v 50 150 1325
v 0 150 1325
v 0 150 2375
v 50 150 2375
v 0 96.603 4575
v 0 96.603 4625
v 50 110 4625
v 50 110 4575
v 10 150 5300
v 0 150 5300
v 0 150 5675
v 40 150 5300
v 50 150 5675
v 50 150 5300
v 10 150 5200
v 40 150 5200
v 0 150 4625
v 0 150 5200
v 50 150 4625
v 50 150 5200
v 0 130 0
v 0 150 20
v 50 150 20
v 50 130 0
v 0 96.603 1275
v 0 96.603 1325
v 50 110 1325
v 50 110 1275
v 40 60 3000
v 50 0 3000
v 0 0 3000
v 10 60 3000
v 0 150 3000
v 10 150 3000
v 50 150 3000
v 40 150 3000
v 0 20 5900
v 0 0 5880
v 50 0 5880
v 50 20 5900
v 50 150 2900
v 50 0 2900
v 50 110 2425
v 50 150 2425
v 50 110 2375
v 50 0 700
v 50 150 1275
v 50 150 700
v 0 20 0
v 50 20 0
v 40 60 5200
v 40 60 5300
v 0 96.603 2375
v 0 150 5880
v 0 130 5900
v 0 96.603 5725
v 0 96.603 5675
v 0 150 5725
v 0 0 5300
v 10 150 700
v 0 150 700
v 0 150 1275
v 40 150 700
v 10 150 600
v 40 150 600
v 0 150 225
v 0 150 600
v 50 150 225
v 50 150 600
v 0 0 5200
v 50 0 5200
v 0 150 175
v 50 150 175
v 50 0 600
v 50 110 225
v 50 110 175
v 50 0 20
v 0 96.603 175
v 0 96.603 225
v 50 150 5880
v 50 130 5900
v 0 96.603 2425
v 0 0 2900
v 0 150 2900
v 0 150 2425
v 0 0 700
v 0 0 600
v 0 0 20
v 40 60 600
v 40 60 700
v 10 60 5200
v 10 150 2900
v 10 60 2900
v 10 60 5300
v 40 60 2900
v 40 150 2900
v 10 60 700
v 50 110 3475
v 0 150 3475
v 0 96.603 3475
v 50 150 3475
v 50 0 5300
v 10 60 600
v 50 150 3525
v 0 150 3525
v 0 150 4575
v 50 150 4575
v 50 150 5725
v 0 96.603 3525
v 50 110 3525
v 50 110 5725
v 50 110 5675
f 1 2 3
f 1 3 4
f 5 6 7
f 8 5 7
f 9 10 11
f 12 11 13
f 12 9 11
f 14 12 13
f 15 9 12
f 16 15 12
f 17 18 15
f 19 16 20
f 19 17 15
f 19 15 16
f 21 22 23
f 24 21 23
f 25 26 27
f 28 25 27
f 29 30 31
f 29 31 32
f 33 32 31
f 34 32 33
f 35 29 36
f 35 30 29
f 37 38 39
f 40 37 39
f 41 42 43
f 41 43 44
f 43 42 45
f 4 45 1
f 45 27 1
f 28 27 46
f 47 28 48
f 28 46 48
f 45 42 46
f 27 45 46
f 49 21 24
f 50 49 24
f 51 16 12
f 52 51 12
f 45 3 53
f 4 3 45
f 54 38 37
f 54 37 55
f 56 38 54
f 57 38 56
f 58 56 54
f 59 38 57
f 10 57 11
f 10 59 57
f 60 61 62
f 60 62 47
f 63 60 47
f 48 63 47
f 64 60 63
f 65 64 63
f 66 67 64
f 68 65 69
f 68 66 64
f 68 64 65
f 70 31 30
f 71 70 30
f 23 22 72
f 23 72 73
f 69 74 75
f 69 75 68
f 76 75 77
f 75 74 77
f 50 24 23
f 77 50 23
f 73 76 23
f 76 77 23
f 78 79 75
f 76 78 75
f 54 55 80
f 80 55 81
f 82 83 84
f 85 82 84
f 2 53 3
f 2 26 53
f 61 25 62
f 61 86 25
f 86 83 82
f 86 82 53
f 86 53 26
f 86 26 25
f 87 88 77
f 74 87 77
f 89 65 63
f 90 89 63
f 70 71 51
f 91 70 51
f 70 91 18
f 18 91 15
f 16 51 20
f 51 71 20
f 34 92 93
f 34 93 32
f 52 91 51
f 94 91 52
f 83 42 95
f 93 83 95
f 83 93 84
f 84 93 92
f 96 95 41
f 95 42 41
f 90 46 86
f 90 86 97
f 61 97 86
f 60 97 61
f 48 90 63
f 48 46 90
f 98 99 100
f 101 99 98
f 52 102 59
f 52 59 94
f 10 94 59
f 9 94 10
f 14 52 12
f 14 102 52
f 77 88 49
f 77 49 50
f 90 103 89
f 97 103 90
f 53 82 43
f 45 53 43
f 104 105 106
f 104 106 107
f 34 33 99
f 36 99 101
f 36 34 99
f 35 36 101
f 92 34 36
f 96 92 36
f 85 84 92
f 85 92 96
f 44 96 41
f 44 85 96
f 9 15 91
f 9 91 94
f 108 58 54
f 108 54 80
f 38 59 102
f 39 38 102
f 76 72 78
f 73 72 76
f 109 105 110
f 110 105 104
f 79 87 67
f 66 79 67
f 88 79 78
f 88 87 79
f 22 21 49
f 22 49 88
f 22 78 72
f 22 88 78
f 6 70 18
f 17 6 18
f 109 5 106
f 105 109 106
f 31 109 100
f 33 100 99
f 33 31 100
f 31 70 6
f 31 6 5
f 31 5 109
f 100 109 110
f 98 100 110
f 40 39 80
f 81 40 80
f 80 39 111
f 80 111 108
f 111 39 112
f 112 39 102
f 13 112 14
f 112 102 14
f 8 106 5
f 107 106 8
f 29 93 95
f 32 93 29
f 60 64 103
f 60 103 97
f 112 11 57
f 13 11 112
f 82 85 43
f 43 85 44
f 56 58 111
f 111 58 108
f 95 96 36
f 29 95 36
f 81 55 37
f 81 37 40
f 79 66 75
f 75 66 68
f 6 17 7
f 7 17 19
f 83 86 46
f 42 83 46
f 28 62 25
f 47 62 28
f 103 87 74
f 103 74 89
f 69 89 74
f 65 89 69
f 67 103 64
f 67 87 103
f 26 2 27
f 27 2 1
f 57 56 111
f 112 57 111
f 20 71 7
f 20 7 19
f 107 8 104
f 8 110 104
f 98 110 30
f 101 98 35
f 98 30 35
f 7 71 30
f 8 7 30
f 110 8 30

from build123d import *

# Parameters (mm, degrees)
ESQUISSE1_W                = 50
ESQUISSE1_H                = 150
BOSS_EXTRU_1_DEPTH         = 5900
ENL_V_START                = -175
ENL_V_MAT_EXTRU_1_DEPTH    = 50
R_P_TITION_LIN_AIRE1_COUNT = 6
R_P_TITION_LIN_AIRE1_PITCH = 1100
CHANFREIN1_SIZE            = 20
ESQUISSE3_W                = 100
ESQUISSE3_H                = 150
ENL_V_MAT_EXTRU_2_DEPTH    = 10
ENL_V_START_2              = -50
ESQUISSE3_2_W              = 100
ESQUISSE3_2_H              = 150
ENL_V_MAT_EXTRU_3_DEPTH    = 10
ESQUISSE4_W                = 100
ESQUISSE4_H                = 60
ENL_V_MAT_EXTRU_4_DEPTH    = 5903.042019505


with BuildPart() as part:
    # Esquisse1 → Boss.-Extru.1 (new body)
    with BuildSketch(Plane.XY):
        with Locations((25, 75)):
            Rectangle(ESQUISSE1_W, ESQUISSE1_H)
    extrude(amount=BOSS_EXTRU_1_DEPTH)

    # Esquisse2 → Enlèv. mat.-Extru.1 (cut)
    with BuildSketch(Plane.XY.offset(5900).offset(ENL_V_START)):
        Polygon((0, 96.602540378), (50, 110), (50, 150), (0, 150), align=None)
    enl_v_mat_extru_1 = extrude(amount=-ENL_V_MAT_EXTRU_1_DEPTH, mode=Mode.SUBTRACT)

    # Répétition linéaire1: Enlèv. mat.-Extru.1 ×6
    with Locations(*[(0, 0, -i * R_P_TITION_LIN_AIRE1_PITCH) for i in range(1, R_P_TITION_LIN_AIRE1_COUNT)]):
        add(enl_v_mat_extru_1, mode=Mode.SUBTRACT)

    # Chanfrein1
    chanfrein1_edges = [part.edges().sort_by_distance(p)[0] for p in [
        (25, 150, 5900),
        (25, 150, 0),
        (25, 0, 0),
        (25, 0, 5900),
    ]]
    chamfer(chanfrein1_edges, length=CHANFREIN1_SIZE)

    # Esquisse3 → Enlèv. mat.-Extru.2 (cut)
    with BuildSketch(Plane.ZY):
        with Locations((650, 75)):
            Rectangle(ESQUISSE3_W, ESQUISSE3_H)
        with Locations((2950, 75)):
            Rectangle(ESQUISSE3_W, ESQUISSE3_H)
        with Locations((5250, 75)):
            Rectangle(ESQUISSE3_W, ESQUISSE3_H)
    extrude(amount=-ENL_V_MAT_EXTRU_2_DEPTH, mode=Mode.SUBTRACT)

    # Esquisse3<2> → Enlèv. mat.-Extru.3 (cut)
    with BuildSketch(Plane.ZY.offset(ENL_V_START_2)):
        with Locations((650, 75)):
            Rectangle(ESQUISSE3_2_W, ESQUISSE3_2_H)
        with Locations((2950, 75)):
            Rectangle(ESQUISSE3_2_W, ESQUISSE3_2_H)
        with Locations((5250, 75)):
            Rectangle(ESQUISSE3_2_W, ESQUISSE3_2_H)
    extrude(amount=ENL_V_MAT_EXTRU_3_DEPTH, mode=Mode.SUBTRACT)

    # Esquisse4 → Enlèv. mat.-Extru.4 (cut, through all)
    with BuildSketch(Plane.ZY.offset(-10)):
        with Locations((650, 30)):
            Rectangle(ESQUISSE4_W, ESQUISSE4_H)
        with Locations((2950, 30)):
            Rectangle(ESQUISSE4_W, ESQUISSE4_H)
        with Locations((5250, 30)):
            Rectangle(ESQUISSE4_W, ESQUISSE4_H)
    extrude(amount=-ENL_V_MAT_EXTRU_4_DEPTH, mode=Mode.SUBTRACT)


solid = part.part
